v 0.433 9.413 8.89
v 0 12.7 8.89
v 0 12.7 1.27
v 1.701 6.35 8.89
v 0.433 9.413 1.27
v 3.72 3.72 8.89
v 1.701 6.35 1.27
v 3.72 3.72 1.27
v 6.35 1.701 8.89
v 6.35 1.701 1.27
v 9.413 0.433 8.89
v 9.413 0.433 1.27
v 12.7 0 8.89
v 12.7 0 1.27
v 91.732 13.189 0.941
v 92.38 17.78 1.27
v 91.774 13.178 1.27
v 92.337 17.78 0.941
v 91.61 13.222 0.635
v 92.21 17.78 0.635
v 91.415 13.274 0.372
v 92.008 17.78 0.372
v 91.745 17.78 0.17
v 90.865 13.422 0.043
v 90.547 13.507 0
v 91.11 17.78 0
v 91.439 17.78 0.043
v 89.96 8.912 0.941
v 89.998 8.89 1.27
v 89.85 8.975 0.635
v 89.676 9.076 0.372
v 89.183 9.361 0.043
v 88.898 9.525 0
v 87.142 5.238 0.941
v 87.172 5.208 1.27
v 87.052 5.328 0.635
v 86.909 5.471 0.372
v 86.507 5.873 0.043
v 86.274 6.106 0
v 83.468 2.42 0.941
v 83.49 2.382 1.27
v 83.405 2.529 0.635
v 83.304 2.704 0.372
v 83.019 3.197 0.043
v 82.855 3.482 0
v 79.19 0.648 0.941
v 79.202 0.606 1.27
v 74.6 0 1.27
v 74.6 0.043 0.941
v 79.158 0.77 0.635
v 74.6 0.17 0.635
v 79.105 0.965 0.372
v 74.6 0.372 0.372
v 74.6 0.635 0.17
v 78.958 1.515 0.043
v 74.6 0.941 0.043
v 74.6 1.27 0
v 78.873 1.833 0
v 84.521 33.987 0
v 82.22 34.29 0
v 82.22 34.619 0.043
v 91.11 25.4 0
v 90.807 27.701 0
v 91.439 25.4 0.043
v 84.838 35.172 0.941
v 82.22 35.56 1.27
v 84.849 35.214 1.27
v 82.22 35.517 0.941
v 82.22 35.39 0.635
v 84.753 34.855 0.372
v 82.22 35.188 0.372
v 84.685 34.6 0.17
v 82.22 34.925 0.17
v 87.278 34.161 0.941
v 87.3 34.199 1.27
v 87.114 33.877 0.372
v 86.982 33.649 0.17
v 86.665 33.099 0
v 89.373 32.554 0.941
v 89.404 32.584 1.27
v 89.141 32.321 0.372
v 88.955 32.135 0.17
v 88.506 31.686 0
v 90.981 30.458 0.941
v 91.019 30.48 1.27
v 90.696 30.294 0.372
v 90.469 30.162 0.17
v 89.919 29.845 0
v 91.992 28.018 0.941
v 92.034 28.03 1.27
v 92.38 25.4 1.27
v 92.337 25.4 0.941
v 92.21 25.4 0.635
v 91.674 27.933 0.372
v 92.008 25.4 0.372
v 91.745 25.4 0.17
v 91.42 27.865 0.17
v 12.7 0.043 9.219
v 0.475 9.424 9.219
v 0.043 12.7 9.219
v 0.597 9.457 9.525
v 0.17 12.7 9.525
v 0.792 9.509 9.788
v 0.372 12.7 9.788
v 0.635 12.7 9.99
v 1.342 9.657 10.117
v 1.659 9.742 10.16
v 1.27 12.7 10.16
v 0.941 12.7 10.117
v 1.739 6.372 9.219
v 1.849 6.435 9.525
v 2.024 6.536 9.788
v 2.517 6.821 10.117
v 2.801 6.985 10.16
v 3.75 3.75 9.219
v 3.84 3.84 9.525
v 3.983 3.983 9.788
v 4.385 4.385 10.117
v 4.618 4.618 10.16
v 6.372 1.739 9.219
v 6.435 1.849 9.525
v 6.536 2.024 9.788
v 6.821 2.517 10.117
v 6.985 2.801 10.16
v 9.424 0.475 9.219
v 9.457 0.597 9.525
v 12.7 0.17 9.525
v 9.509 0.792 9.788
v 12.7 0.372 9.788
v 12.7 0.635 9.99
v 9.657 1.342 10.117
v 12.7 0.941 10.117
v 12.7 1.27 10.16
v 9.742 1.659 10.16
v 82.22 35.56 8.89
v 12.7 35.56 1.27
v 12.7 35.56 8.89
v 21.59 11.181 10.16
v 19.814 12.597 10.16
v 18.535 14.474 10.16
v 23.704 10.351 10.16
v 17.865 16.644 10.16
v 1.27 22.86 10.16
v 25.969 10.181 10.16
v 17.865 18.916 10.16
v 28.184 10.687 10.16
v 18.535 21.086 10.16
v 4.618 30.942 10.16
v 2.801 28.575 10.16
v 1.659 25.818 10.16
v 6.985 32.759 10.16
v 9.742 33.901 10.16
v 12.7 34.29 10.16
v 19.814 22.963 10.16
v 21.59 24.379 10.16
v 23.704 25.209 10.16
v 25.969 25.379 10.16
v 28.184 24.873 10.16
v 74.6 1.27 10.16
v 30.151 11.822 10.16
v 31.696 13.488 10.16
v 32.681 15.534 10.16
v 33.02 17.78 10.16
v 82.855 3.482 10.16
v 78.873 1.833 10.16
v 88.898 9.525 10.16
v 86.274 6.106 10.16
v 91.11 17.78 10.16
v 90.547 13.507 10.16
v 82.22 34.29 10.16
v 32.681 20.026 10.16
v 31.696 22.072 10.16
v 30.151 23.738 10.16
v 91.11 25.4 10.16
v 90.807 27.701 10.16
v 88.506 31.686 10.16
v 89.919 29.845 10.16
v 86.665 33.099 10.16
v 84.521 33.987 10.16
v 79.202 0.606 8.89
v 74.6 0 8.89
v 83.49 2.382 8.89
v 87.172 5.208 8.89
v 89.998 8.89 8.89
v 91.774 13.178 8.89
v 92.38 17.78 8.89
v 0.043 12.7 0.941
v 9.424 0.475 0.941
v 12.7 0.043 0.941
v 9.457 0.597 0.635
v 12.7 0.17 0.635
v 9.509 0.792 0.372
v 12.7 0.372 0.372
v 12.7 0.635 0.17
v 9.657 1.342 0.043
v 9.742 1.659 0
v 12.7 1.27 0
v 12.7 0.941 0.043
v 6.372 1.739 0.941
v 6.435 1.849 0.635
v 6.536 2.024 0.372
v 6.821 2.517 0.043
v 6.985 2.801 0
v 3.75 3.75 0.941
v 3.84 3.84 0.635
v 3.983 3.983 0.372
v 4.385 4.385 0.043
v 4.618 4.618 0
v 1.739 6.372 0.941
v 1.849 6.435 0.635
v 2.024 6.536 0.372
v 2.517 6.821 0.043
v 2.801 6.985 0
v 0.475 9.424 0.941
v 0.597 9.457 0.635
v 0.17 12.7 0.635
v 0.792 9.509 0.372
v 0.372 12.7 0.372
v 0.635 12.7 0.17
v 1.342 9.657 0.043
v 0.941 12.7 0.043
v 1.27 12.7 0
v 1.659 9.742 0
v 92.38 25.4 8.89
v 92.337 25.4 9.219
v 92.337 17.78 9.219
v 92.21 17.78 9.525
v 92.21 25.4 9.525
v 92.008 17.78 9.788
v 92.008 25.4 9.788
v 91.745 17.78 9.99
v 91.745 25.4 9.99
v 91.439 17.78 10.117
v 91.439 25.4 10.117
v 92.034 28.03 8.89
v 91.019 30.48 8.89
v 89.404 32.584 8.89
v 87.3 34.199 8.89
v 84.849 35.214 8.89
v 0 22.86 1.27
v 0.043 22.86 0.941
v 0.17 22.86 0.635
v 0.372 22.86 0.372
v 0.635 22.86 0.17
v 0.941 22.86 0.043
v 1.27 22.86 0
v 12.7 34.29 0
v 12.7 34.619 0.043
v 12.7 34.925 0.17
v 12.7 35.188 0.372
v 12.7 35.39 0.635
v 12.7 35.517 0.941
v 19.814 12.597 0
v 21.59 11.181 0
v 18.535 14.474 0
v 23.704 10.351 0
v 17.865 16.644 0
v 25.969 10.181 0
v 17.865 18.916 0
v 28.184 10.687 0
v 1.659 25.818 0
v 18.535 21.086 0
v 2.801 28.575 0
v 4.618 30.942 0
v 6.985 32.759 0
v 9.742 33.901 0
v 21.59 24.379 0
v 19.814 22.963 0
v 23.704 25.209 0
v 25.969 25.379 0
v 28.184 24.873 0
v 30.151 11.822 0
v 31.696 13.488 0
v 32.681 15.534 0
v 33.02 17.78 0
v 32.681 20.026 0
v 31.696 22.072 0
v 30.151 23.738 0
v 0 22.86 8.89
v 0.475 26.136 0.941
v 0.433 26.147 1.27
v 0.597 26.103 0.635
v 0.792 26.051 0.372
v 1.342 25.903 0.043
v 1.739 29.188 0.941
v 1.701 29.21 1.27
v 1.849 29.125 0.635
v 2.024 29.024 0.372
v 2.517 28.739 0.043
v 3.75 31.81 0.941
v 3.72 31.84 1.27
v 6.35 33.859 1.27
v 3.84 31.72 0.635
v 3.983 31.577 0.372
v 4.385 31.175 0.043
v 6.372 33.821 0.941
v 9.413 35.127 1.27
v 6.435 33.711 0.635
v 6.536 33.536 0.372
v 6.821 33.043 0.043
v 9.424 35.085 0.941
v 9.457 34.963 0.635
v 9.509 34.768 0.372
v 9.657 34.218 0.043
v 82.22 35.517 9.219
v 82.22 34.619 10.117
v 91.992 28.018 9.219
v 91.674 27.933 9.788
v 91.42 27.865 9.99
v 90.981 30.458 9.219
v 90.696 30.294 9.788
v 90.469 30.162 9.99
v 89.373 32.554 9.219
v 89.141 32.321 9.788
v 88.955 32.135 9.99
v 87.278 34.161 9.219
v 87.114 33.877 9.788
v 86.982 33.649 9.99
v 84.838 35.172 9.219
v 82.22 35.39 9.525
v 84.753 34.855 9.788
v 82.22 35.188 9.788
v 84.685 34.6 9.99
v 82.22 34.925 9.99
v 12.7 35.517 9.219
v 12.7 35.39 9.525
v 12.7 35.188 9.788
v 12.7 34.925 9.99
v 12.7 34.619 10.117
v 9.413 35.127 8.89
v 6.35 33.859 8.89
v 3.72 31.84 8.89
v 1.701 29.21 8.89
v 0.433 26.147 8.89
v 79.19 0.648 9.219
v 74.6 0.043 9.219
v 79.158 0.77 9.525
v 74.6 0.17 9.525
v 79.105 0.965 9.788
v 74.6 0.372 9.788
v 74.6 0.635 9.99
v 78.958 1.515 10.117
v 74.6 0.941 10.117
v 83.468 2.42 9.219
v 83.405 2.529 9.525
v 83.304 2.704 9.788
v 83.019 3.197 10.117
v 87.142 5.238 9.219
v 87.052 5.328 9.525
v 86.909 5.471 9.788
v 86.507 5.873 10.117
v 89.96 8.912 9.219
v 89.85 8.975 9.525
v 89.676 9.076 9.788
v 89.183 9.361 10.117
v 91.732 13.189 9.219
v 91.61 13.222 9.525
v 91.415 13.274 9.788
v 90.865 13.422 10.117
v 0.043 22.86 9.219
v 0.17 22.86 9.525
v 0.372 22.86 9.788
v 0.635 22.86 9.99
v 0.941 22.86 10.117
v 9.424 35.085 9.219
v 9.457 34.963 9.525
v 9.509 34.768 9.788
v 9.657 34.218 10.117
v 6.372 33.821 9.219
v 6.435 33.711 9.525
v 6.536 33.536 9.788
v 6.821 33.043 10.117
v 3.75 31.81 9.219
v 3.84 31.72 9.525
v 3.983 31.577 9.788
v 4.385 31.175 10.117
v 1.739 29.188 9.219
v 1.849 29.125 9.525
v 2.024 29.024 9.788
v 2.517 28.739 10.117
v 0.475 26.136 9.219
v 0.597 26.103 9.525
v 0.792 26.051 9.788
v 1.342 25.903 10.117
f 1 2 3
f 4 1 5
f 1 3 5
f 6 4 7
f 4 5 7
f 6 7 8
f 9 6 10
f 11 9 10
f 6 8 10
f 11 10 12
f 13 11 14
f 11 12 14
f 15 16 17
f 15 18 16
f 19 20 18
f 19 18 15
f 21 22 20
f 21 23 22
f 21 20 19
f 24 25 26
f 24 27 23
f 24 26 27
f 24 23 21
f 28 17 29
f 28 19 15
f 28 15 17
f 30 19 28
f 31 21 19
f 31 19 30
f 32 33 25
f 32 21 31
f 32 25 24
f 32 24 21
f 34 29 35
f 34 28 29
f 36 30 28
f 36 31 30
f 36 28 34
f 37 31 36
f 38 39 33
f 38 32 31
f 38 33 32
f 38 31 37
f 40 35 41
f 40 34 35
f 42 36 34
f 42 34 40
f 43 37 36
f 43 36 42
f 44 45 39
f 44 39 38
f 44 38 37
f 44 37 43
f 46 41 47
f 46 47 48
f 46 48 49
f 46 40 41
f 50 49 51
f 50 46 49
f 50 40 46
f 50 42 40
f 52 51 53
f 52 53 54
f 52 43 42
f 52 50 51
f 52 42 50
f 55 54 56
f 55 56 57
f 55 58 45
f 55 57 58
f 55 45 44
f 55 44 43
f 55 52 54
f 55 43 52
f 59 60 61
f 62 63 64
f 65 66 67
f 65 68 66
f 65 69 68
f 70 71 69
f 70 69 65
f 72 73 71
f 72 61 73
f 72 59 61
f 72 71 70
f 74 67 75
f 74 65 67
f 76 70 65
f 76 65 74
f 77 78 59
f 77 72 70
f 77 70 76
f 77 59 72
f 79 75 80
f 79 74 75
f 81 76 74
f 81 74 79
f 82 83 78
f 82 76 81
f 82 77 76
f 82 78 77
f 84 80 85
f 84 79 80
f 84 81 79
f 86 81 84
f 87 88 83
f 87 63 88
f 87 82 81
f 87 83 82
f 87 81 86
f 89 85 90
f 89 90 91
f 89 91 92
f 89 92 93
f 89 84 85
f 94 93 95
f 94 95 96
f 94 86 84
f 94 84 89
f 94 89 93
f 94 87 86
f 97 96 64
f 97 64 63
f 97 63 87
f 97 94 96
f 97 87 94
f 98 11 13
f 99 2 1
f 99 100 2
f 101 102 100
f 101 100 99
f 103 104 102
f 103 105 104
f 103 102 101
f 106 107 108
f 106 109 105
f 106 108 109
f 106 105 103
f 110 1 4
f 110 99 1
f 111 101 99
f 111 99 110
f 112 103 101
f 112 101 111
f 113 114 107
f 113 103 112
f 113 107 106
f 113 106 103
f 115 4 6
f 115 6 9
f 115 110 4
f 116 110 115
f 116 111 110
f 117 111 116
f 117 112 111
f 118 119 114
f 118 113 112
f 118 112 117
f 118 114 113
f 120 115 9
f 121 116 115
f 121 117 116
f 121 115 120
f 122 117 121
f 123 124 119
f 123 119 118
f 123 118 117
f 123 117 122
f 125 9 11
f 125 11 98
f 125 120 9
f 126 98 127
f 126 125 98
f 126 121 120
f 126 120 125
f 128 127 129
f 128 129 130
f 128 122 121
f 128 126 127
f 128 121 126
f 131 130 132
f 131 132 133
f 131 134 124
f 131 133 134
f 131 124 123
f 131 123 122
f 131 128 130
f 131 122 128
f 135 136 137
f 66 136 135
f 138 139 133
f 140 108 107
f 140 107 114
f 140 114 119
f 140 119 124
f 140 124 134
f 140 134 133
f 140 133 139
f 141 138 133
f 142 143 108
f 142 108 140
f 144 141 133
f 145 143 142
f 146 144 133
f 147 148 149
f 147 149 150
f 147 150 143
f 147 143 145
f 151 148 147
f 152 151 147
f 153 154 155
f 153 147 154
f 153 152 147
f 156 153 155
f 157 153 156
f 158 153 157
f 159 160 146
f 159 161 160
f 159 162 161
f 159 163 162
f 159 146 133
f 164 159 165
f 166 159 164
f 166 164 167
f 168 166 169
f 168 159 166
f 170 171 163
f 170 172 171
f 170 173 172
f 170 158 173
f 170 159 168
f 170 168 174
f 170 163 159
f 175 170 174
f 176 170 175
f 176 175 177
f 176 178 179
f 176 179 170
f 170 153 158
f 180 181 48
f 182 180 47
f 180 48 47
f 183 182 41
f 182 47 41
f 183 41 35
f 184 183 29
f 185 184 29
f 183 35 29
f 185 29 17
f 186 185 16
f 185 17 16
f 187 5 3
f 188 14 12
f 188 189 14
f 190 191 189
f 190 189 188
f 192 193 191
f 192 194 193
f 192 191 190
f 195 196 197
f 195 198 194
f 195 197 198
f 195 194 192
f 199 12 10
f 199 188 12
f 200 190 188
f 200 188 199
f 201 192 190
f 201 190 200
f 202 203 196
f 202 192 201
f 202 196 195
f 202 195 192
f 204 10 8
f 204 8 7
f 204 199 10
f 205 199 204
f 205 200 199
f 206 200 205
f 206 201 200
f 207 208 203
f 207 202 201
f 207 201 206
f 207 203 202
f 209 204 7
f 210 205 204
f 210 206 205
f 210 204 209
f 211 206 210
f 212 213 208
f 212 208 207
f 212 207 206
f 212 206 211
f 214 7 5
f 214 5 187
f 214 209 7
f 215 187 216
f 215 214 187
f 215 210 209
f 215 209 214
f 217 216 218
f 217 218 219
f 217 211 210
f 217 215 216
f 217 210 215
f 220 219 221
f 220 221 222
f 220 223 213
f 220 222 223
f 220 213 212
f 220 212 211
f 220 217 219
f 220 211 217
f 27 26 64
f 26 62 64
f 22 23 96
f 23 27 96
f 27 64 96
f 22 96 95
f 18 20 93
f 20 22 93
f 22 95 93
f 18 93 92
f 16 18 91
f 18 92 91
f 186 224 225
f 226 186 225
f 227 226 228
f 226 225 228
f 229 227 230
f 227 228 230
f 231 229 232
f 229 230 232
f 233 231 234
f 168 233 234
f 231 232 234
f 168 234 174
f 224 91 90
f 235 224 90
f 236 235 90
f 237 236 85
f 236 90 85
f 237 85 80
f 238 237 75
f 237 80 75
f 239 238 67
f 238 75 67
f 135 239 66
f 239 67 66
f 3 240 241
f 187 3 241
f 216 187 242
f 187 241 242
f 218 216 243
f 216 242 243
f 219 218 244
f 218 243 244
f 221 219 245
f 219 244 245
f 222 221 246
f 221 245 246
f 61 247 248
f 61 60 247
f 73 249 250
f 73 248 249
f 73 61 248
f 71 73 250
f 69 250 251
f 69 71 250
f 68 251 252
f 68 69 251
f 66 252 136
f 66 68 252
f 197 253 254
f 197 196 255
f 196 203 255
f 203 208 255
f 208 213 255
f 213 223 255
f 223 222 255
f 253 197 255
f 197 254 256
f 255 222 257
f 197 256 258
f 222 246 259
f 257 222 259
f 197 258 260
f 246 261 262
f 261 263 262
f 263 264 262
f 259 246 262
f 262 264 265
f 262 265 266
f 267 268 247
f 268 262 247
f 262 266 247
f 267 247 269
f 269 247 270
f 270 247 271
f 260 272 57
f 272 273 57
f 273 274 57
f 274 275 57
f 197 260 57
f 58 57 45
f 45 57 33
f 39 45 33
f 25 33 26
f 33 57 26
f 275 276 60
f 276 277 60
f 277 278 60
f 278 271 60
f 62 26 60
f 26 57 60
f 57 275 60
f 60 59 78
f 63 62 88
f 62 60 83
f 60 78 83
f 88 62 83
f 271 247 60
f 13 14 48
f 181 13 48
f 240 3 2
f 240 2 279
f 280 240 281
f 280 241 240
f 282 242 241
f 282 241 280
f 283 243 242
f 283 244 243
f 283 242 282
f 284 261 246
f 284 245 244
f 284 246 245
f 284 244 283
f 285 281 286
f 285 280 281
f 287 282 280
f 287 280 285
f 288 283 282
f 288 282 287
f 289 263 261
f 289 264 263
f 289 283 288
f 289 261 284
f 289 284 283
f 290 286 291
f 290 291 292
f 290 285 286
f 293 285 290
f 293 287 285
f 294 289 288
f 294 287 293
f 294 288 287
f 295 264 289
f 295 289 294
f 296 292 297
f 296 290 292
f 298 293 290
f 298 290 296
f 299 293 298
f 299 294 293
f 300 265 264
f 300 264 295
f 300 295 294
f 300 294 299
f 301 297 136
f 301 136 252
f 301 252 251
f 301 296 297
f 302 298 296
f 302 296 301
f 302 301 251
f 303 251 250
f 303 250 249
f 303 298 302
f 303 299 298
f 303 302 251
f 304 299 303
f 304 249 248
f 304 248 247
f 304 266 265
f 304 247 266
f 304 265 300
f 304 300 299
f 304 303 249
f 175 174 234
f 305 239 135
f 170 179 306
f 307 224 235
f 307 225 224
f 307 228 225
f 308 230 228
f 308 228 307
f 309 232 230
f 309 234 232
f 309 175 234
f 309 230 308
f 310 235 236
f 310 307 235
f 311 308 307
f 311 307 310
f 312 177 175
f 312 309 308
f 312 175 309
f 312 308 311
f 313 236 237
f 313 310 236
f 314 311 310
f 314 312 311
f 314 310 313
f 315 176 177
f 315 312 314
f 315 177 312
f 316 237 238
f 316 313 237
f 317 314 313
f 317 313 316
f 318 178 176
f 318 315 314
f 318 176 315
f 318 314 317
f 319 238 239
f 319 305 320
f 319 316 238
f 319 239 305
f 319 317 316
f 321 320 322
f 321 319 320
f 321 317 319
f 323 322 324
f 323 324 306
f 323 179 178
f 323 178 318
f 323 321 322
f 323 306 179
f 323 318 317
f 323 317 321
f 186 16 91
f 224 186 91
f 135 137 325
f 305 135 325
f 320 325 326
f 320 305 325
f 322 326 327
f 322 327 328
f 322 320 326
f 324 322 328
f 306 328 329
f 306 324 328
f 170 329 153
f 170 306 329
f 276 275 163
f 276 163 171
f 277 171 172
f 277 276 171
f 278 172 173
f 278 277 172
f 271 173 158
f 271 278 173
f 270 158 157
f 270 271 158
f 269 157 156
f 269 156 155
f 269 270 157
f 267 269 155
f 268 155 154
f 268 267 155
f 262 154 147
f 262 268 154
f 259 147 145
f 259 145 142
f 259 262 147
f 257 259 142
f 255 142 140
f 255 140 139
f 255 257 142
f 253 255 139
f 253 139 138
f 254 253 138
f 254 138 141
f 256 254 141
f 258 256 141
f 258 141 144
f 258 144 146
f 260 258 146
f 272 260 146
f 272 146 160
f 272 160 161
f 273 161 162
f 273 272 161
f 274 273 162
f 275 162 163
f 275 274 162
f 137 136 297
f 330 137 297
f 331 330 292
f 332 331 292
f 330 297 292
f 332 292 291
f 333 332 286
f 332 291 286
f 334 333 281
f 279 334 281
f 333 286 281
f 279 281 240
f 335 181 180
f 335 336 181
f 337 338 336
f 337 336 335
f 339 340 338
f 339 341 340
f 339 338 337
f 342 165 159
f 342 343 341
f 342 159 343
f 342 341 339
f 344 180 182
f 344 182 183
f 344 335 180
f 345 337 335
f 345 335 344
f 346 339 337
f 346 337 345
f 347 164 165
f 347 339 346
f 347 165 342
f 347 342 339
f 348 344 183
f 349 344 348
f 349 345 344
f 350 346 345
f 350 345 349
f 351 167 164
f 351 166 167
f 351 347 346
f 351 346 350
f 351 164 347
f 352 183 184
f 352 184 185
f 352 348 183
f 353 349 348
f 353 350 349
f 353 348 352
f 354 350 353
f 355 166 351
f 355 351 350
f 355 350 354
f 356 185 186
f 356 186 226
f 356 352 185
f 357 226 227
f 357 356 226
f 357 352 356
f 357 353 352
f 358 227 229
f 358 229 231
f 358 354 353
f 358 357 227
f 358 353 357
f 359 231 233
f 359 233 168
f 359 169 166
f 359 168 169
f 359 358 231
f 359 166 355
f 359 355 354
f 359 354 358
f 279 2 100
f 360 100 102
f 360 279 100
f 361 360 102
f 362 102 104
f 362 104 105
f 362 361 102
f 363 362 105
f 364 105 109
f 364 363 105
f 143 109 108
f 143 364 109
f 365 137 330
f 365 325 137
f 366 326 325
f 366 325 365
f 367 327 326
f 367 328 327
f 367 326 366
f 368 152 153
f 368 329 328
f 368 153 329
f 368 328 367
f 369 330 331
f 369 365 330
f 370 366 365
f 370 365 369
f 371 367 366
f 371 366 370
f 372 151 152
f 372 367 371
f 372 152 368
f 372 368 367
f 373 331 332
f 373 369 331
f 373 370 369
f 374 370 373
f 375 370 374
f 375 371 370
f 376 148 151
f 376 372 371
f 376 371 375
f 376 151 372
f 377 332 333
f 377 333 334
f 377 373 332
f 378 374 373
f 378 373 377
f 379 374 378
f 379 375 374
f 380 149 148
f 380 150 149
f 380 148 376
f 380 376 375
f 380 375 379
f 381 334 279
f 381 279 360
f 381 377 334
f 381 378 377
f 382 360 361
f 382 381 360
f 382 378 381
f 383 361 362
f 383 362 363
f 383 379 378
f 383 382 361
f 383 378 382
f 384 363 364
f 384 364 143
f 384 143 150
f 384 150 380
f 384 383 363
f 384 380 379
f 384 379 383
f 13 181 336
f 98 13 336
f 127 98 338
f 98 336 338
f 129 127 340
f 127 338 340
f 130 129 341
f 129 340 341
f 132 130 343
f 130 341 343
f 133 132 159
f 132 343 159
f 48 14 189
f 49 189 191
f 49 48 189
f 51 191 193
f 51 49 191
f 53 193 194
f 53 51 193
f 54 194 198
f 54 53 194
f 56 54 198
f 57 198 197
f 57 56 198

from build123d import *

# Parameters (mm, degrees)
SKETCH1_W           = 92.3798
SKETCH1_H           = 35.56
SKETCH1_R           = 7.62
BOSS_EXTRUDE1_DEPTH = 10.16
FILLET1_R           = 1.27
FILLET2_R           = 1.27
FILLET3_R           = 17.78
FILLET4_R           = 10.16
FILLET5_R           = 12.7
FILLET6_R           = 12.7


with BuildPart() as part:
    # Sketch1 → Boss-Extrude1 (new body)
    with BuildSketch(Plane.XY):
        with Locations((46.1899, 17.78)):
            Rectangle(SKETCH1_W, SKETCH1_H)
        with Locations((25.4, 17.78)):
            Circle(SKETCH1_R, mode=Mode.SUBTRACT)
    extrude(amount=BOSS_EXTRUDE1_DEPTH)

    # Fillet1
    fillet1_edges = [part.edges().sort_by_distance(p)[0] for p in [
        (46.1899, 35.56, 10.16),
        (0, 17.78, 10.16),
        (46.1899, 0, 10.16),
        (92.3798, 17.78, 10.16),
    ]]
    fillet(fillet1_edges, radius=FILLET1_R)

    # Fillet2
    fillet2_edges = [part.edges().sort_by_distance(p)[0] for p in [
        (0, 17.78, 0),
        (46.1899, 35.56, 0),
        (92.3798, 17.78, 0),
        (46.1899, 0, 0),
    ]]
    fillet(fillet2_edges, radius=FILLET2_R)

    # Fillet3
    # the kernel refuses this fillet: 17.78 mm, written as the material it takes off along each edge
    with BuildSketch(Plane(origin=(74.5998, 17.78, 10.16), x_dir=(0, -1, 0), z_dir=(-1, 0, 0))) as fillet3_piece_1:
        with BuildLine():
            CenterArc((16.51, -1.27), 1.27, 0, 90)
            Line((17.78, -1.27), (17.78, 0))
            Line((17.78, 0), (16.51, 0))
        make_face()
    revolve(axis=Axis((74.5998, 17.78, 10.16), (0, 0, 1)), revolution_arc=90, mode=Mode.SUBTRACT)
    with BuildSketch(Plane(origin=(74.5998, 17.78, 0), x_dir=(1, 0, 0), z_dir=(0, 1, 0))) as fillet3_piece_2:
        with BuildLine():
            CenterArc((16.51, -1.27), 1.27, 0, 90)
            Line((17.78, -1.27), (17.78, 0))
            Line((17.78, 0), (16.51, 0))
        make_face()
    revolve(axis=Axis((74.5998, 17.78, 0), (0, 0, -1)), revolution_arc=90, mode=Mode.SUBTRACT)
    with BuildSketch(Plane(origin=(92.3798, 0, 0), x_dir=(-1, 0, 0), z_dir=(0, 0, 1))) as fillet3_piece_3:
        with BuildLine():
            CenterArc((FILLET3_R, -FILLET3_R), FILLET3_R, 90, 90)
            Line((0, -FILLET3_R), (0, 0))
            Line((0, 0), (FILLET3_R, 0))
        make_face()
    extrude(amount=10.16, mode=Mode.SUBTRACT)

    # Fillet4
    # the kernel refuses this fillet: 10.16 mm, written as the material it takes off along each edge
    with BuildSketch(Plane(origin=(82.2198, 25.4, 10.16), x_dir=(1, 0, 0), z_dir=(0, -1, 0))) as fillet4_piece_1:
        with BuildLine():
            CenterArc((8.89, -1.27), 1.27, 0, 90)
            Line((10.16, -1.27), (10.16, 0))
            Line((10.16, 0), (8.89, 0))
        make_face()
    revolve(axis=Axis((82.2198, 25.4, 10.16), (0, 0, 1)), revolution_arc=90, mode=Mode.SUBTRACT)
    with BuildSketch(Plane(origin=(82.2198, 25.4, 0), x_dir=(0, 1, 0), z_dir=(-1, 0, 0))) as fillet4_piece_2:
        with BuildLine():
            CenterArc((8.89, -1.27), 1.27, 0, 90)
            Line((10.16, -1.27), (10.16, 0))
            Line((10.16, 0), (8.89, 0))
        make_face()
    revolve(axis=Axis((82.2198, 25.4, 0), (0, 0, -1)), revolution_arc=90, mode=Mode.SUBTRACT)
    with BuildSketch(Plane(origin=(92.3798, 35.56, 0), x_dir=(-1, 0, 0), z_dir=(0, 0, 1))) as fillet4_piece_3:
        with BuildLine():
            CenterArc((FILLET4_R, FILLET4_R), FILLET4_R, 180, 90)
            Line((0, FILLET4_R), (0, 0))
            Line((0, 0), (FILLET4_R, 0))
        make_face()
    extrude(amount=10.16, mode=Mode.SUBTRACT)

    # Fillet5
    # the kernel refuses this fillet: 12.7 mm, written as the material it takes off along each edge
    with BuildSketch(Plane(origin=(12.7, 22.86, 10.16), x_dir=(0, 1, 0), z_dir=(1, 0, 0))) as fillet5_piece_1:
        with BuildLine():
            CenterArc((11.43, -1.27), 1.27, 0, 90)
            Line((12.7, -1.27), (12.7, 0))
            Line((12.7, 0), (11.43, 0))
        make_face()
    revolve(axis=Axis((12.7, 22.86, 10.16), (0, 0, 1)), revolution_arc=90, mode=Mode.SUBTRACT)
    with BuildSketch(Plane(origin=(12.7, 22.86, 0), x_dir=(-1, 0, 0), z_dir=(0, -1, 0))) as fillet5_piece_2:
        with BuildLine():
            CenterArc((11.43, -1.27), 1.27, 0, 90)
            Line((12.7, -1.27), (12.7, 0))
            Line((12.7, 0), (11.43, 0))
        make_face()
    revolve(axis=Axis((12.7, 22.86, 0), (0, 0, -1)), revolution_arc=90, mode=Mode.SUBTRACT)
    with BuildSketch(Plane(origin=(0, 35.56, 0), x_dir=(0, -1, 0), z_dir=(0, 0, 1))) as fillet5_piece_3:
        with BuildLine():
            CenterArc((FILLET5_R, FILLET5_R), FILLET5_R, 180, 90)
            Line((0, FILLET5_R), (0, 0))
            Line((0, 0), (FILLET5_R, 0))
        make_face()
    extrude(amount=10.16, mode=Mode.SUBTRACT)

    # Fillet6
    # the kernel refuses this fillet: 12.7 mm, written as the material it takes off along each edge
    with BuildSketch(Plane(origin=(12.7, 12.7, 10.16), x_dir=(-1, 0, 0), z_dir=(0, 1, 0))) as fillet6_piece_1:
        with BuildLine():
            CenterArc((11.43, -1.27), 1.27, 0, 90)
            Line((12.7, -1.27), (12.7, 0))
            Line((12.7, 0), (11.43, 0))
        make_face()
    revolve(axis=Axis((12.7, 12.7, 10.16), (0, 0, 1)), revolution_arc=90, mode=Mode.SUBTRACT)
    with BuildSketch(Plane(origin=(12.7, 12.7, 0), x_dir=(0, -1, 0), z_dir=(1, 0, 0))) as fillet6_piece_2:
        with BuildLine():
            CenterArc((11.43, -1.27), 1.27, 0, 90)
            Line((12.7, -1.27), (12.7, 0))
            Line((12.7, 0), (11.43, 0))
        make_face()
    revolve(axis=Axis((12.7, 12.7, 0), (0, 0, -1)), revolution_arc=90, mode=Mode.SUBTRACT)
    with BuildSketch(Plane(origin=(0, 0, 0), x_dir=(0, 1, 0), z_dir=(0, 0, 1))) as fillet6_piece_3:
        with BuildLine():
            CenterArc((FILLET6_R, -FILLET6_R), FILLET6_R, 90, 90)
            Line((0, -FILLET6_R), (0, 0))
            Line((0, 0), (FILLET6_R, 0))
        make_face()
    extrude(amount=10.16, mode=Mode.SUBTRACT)


solid = part.part
